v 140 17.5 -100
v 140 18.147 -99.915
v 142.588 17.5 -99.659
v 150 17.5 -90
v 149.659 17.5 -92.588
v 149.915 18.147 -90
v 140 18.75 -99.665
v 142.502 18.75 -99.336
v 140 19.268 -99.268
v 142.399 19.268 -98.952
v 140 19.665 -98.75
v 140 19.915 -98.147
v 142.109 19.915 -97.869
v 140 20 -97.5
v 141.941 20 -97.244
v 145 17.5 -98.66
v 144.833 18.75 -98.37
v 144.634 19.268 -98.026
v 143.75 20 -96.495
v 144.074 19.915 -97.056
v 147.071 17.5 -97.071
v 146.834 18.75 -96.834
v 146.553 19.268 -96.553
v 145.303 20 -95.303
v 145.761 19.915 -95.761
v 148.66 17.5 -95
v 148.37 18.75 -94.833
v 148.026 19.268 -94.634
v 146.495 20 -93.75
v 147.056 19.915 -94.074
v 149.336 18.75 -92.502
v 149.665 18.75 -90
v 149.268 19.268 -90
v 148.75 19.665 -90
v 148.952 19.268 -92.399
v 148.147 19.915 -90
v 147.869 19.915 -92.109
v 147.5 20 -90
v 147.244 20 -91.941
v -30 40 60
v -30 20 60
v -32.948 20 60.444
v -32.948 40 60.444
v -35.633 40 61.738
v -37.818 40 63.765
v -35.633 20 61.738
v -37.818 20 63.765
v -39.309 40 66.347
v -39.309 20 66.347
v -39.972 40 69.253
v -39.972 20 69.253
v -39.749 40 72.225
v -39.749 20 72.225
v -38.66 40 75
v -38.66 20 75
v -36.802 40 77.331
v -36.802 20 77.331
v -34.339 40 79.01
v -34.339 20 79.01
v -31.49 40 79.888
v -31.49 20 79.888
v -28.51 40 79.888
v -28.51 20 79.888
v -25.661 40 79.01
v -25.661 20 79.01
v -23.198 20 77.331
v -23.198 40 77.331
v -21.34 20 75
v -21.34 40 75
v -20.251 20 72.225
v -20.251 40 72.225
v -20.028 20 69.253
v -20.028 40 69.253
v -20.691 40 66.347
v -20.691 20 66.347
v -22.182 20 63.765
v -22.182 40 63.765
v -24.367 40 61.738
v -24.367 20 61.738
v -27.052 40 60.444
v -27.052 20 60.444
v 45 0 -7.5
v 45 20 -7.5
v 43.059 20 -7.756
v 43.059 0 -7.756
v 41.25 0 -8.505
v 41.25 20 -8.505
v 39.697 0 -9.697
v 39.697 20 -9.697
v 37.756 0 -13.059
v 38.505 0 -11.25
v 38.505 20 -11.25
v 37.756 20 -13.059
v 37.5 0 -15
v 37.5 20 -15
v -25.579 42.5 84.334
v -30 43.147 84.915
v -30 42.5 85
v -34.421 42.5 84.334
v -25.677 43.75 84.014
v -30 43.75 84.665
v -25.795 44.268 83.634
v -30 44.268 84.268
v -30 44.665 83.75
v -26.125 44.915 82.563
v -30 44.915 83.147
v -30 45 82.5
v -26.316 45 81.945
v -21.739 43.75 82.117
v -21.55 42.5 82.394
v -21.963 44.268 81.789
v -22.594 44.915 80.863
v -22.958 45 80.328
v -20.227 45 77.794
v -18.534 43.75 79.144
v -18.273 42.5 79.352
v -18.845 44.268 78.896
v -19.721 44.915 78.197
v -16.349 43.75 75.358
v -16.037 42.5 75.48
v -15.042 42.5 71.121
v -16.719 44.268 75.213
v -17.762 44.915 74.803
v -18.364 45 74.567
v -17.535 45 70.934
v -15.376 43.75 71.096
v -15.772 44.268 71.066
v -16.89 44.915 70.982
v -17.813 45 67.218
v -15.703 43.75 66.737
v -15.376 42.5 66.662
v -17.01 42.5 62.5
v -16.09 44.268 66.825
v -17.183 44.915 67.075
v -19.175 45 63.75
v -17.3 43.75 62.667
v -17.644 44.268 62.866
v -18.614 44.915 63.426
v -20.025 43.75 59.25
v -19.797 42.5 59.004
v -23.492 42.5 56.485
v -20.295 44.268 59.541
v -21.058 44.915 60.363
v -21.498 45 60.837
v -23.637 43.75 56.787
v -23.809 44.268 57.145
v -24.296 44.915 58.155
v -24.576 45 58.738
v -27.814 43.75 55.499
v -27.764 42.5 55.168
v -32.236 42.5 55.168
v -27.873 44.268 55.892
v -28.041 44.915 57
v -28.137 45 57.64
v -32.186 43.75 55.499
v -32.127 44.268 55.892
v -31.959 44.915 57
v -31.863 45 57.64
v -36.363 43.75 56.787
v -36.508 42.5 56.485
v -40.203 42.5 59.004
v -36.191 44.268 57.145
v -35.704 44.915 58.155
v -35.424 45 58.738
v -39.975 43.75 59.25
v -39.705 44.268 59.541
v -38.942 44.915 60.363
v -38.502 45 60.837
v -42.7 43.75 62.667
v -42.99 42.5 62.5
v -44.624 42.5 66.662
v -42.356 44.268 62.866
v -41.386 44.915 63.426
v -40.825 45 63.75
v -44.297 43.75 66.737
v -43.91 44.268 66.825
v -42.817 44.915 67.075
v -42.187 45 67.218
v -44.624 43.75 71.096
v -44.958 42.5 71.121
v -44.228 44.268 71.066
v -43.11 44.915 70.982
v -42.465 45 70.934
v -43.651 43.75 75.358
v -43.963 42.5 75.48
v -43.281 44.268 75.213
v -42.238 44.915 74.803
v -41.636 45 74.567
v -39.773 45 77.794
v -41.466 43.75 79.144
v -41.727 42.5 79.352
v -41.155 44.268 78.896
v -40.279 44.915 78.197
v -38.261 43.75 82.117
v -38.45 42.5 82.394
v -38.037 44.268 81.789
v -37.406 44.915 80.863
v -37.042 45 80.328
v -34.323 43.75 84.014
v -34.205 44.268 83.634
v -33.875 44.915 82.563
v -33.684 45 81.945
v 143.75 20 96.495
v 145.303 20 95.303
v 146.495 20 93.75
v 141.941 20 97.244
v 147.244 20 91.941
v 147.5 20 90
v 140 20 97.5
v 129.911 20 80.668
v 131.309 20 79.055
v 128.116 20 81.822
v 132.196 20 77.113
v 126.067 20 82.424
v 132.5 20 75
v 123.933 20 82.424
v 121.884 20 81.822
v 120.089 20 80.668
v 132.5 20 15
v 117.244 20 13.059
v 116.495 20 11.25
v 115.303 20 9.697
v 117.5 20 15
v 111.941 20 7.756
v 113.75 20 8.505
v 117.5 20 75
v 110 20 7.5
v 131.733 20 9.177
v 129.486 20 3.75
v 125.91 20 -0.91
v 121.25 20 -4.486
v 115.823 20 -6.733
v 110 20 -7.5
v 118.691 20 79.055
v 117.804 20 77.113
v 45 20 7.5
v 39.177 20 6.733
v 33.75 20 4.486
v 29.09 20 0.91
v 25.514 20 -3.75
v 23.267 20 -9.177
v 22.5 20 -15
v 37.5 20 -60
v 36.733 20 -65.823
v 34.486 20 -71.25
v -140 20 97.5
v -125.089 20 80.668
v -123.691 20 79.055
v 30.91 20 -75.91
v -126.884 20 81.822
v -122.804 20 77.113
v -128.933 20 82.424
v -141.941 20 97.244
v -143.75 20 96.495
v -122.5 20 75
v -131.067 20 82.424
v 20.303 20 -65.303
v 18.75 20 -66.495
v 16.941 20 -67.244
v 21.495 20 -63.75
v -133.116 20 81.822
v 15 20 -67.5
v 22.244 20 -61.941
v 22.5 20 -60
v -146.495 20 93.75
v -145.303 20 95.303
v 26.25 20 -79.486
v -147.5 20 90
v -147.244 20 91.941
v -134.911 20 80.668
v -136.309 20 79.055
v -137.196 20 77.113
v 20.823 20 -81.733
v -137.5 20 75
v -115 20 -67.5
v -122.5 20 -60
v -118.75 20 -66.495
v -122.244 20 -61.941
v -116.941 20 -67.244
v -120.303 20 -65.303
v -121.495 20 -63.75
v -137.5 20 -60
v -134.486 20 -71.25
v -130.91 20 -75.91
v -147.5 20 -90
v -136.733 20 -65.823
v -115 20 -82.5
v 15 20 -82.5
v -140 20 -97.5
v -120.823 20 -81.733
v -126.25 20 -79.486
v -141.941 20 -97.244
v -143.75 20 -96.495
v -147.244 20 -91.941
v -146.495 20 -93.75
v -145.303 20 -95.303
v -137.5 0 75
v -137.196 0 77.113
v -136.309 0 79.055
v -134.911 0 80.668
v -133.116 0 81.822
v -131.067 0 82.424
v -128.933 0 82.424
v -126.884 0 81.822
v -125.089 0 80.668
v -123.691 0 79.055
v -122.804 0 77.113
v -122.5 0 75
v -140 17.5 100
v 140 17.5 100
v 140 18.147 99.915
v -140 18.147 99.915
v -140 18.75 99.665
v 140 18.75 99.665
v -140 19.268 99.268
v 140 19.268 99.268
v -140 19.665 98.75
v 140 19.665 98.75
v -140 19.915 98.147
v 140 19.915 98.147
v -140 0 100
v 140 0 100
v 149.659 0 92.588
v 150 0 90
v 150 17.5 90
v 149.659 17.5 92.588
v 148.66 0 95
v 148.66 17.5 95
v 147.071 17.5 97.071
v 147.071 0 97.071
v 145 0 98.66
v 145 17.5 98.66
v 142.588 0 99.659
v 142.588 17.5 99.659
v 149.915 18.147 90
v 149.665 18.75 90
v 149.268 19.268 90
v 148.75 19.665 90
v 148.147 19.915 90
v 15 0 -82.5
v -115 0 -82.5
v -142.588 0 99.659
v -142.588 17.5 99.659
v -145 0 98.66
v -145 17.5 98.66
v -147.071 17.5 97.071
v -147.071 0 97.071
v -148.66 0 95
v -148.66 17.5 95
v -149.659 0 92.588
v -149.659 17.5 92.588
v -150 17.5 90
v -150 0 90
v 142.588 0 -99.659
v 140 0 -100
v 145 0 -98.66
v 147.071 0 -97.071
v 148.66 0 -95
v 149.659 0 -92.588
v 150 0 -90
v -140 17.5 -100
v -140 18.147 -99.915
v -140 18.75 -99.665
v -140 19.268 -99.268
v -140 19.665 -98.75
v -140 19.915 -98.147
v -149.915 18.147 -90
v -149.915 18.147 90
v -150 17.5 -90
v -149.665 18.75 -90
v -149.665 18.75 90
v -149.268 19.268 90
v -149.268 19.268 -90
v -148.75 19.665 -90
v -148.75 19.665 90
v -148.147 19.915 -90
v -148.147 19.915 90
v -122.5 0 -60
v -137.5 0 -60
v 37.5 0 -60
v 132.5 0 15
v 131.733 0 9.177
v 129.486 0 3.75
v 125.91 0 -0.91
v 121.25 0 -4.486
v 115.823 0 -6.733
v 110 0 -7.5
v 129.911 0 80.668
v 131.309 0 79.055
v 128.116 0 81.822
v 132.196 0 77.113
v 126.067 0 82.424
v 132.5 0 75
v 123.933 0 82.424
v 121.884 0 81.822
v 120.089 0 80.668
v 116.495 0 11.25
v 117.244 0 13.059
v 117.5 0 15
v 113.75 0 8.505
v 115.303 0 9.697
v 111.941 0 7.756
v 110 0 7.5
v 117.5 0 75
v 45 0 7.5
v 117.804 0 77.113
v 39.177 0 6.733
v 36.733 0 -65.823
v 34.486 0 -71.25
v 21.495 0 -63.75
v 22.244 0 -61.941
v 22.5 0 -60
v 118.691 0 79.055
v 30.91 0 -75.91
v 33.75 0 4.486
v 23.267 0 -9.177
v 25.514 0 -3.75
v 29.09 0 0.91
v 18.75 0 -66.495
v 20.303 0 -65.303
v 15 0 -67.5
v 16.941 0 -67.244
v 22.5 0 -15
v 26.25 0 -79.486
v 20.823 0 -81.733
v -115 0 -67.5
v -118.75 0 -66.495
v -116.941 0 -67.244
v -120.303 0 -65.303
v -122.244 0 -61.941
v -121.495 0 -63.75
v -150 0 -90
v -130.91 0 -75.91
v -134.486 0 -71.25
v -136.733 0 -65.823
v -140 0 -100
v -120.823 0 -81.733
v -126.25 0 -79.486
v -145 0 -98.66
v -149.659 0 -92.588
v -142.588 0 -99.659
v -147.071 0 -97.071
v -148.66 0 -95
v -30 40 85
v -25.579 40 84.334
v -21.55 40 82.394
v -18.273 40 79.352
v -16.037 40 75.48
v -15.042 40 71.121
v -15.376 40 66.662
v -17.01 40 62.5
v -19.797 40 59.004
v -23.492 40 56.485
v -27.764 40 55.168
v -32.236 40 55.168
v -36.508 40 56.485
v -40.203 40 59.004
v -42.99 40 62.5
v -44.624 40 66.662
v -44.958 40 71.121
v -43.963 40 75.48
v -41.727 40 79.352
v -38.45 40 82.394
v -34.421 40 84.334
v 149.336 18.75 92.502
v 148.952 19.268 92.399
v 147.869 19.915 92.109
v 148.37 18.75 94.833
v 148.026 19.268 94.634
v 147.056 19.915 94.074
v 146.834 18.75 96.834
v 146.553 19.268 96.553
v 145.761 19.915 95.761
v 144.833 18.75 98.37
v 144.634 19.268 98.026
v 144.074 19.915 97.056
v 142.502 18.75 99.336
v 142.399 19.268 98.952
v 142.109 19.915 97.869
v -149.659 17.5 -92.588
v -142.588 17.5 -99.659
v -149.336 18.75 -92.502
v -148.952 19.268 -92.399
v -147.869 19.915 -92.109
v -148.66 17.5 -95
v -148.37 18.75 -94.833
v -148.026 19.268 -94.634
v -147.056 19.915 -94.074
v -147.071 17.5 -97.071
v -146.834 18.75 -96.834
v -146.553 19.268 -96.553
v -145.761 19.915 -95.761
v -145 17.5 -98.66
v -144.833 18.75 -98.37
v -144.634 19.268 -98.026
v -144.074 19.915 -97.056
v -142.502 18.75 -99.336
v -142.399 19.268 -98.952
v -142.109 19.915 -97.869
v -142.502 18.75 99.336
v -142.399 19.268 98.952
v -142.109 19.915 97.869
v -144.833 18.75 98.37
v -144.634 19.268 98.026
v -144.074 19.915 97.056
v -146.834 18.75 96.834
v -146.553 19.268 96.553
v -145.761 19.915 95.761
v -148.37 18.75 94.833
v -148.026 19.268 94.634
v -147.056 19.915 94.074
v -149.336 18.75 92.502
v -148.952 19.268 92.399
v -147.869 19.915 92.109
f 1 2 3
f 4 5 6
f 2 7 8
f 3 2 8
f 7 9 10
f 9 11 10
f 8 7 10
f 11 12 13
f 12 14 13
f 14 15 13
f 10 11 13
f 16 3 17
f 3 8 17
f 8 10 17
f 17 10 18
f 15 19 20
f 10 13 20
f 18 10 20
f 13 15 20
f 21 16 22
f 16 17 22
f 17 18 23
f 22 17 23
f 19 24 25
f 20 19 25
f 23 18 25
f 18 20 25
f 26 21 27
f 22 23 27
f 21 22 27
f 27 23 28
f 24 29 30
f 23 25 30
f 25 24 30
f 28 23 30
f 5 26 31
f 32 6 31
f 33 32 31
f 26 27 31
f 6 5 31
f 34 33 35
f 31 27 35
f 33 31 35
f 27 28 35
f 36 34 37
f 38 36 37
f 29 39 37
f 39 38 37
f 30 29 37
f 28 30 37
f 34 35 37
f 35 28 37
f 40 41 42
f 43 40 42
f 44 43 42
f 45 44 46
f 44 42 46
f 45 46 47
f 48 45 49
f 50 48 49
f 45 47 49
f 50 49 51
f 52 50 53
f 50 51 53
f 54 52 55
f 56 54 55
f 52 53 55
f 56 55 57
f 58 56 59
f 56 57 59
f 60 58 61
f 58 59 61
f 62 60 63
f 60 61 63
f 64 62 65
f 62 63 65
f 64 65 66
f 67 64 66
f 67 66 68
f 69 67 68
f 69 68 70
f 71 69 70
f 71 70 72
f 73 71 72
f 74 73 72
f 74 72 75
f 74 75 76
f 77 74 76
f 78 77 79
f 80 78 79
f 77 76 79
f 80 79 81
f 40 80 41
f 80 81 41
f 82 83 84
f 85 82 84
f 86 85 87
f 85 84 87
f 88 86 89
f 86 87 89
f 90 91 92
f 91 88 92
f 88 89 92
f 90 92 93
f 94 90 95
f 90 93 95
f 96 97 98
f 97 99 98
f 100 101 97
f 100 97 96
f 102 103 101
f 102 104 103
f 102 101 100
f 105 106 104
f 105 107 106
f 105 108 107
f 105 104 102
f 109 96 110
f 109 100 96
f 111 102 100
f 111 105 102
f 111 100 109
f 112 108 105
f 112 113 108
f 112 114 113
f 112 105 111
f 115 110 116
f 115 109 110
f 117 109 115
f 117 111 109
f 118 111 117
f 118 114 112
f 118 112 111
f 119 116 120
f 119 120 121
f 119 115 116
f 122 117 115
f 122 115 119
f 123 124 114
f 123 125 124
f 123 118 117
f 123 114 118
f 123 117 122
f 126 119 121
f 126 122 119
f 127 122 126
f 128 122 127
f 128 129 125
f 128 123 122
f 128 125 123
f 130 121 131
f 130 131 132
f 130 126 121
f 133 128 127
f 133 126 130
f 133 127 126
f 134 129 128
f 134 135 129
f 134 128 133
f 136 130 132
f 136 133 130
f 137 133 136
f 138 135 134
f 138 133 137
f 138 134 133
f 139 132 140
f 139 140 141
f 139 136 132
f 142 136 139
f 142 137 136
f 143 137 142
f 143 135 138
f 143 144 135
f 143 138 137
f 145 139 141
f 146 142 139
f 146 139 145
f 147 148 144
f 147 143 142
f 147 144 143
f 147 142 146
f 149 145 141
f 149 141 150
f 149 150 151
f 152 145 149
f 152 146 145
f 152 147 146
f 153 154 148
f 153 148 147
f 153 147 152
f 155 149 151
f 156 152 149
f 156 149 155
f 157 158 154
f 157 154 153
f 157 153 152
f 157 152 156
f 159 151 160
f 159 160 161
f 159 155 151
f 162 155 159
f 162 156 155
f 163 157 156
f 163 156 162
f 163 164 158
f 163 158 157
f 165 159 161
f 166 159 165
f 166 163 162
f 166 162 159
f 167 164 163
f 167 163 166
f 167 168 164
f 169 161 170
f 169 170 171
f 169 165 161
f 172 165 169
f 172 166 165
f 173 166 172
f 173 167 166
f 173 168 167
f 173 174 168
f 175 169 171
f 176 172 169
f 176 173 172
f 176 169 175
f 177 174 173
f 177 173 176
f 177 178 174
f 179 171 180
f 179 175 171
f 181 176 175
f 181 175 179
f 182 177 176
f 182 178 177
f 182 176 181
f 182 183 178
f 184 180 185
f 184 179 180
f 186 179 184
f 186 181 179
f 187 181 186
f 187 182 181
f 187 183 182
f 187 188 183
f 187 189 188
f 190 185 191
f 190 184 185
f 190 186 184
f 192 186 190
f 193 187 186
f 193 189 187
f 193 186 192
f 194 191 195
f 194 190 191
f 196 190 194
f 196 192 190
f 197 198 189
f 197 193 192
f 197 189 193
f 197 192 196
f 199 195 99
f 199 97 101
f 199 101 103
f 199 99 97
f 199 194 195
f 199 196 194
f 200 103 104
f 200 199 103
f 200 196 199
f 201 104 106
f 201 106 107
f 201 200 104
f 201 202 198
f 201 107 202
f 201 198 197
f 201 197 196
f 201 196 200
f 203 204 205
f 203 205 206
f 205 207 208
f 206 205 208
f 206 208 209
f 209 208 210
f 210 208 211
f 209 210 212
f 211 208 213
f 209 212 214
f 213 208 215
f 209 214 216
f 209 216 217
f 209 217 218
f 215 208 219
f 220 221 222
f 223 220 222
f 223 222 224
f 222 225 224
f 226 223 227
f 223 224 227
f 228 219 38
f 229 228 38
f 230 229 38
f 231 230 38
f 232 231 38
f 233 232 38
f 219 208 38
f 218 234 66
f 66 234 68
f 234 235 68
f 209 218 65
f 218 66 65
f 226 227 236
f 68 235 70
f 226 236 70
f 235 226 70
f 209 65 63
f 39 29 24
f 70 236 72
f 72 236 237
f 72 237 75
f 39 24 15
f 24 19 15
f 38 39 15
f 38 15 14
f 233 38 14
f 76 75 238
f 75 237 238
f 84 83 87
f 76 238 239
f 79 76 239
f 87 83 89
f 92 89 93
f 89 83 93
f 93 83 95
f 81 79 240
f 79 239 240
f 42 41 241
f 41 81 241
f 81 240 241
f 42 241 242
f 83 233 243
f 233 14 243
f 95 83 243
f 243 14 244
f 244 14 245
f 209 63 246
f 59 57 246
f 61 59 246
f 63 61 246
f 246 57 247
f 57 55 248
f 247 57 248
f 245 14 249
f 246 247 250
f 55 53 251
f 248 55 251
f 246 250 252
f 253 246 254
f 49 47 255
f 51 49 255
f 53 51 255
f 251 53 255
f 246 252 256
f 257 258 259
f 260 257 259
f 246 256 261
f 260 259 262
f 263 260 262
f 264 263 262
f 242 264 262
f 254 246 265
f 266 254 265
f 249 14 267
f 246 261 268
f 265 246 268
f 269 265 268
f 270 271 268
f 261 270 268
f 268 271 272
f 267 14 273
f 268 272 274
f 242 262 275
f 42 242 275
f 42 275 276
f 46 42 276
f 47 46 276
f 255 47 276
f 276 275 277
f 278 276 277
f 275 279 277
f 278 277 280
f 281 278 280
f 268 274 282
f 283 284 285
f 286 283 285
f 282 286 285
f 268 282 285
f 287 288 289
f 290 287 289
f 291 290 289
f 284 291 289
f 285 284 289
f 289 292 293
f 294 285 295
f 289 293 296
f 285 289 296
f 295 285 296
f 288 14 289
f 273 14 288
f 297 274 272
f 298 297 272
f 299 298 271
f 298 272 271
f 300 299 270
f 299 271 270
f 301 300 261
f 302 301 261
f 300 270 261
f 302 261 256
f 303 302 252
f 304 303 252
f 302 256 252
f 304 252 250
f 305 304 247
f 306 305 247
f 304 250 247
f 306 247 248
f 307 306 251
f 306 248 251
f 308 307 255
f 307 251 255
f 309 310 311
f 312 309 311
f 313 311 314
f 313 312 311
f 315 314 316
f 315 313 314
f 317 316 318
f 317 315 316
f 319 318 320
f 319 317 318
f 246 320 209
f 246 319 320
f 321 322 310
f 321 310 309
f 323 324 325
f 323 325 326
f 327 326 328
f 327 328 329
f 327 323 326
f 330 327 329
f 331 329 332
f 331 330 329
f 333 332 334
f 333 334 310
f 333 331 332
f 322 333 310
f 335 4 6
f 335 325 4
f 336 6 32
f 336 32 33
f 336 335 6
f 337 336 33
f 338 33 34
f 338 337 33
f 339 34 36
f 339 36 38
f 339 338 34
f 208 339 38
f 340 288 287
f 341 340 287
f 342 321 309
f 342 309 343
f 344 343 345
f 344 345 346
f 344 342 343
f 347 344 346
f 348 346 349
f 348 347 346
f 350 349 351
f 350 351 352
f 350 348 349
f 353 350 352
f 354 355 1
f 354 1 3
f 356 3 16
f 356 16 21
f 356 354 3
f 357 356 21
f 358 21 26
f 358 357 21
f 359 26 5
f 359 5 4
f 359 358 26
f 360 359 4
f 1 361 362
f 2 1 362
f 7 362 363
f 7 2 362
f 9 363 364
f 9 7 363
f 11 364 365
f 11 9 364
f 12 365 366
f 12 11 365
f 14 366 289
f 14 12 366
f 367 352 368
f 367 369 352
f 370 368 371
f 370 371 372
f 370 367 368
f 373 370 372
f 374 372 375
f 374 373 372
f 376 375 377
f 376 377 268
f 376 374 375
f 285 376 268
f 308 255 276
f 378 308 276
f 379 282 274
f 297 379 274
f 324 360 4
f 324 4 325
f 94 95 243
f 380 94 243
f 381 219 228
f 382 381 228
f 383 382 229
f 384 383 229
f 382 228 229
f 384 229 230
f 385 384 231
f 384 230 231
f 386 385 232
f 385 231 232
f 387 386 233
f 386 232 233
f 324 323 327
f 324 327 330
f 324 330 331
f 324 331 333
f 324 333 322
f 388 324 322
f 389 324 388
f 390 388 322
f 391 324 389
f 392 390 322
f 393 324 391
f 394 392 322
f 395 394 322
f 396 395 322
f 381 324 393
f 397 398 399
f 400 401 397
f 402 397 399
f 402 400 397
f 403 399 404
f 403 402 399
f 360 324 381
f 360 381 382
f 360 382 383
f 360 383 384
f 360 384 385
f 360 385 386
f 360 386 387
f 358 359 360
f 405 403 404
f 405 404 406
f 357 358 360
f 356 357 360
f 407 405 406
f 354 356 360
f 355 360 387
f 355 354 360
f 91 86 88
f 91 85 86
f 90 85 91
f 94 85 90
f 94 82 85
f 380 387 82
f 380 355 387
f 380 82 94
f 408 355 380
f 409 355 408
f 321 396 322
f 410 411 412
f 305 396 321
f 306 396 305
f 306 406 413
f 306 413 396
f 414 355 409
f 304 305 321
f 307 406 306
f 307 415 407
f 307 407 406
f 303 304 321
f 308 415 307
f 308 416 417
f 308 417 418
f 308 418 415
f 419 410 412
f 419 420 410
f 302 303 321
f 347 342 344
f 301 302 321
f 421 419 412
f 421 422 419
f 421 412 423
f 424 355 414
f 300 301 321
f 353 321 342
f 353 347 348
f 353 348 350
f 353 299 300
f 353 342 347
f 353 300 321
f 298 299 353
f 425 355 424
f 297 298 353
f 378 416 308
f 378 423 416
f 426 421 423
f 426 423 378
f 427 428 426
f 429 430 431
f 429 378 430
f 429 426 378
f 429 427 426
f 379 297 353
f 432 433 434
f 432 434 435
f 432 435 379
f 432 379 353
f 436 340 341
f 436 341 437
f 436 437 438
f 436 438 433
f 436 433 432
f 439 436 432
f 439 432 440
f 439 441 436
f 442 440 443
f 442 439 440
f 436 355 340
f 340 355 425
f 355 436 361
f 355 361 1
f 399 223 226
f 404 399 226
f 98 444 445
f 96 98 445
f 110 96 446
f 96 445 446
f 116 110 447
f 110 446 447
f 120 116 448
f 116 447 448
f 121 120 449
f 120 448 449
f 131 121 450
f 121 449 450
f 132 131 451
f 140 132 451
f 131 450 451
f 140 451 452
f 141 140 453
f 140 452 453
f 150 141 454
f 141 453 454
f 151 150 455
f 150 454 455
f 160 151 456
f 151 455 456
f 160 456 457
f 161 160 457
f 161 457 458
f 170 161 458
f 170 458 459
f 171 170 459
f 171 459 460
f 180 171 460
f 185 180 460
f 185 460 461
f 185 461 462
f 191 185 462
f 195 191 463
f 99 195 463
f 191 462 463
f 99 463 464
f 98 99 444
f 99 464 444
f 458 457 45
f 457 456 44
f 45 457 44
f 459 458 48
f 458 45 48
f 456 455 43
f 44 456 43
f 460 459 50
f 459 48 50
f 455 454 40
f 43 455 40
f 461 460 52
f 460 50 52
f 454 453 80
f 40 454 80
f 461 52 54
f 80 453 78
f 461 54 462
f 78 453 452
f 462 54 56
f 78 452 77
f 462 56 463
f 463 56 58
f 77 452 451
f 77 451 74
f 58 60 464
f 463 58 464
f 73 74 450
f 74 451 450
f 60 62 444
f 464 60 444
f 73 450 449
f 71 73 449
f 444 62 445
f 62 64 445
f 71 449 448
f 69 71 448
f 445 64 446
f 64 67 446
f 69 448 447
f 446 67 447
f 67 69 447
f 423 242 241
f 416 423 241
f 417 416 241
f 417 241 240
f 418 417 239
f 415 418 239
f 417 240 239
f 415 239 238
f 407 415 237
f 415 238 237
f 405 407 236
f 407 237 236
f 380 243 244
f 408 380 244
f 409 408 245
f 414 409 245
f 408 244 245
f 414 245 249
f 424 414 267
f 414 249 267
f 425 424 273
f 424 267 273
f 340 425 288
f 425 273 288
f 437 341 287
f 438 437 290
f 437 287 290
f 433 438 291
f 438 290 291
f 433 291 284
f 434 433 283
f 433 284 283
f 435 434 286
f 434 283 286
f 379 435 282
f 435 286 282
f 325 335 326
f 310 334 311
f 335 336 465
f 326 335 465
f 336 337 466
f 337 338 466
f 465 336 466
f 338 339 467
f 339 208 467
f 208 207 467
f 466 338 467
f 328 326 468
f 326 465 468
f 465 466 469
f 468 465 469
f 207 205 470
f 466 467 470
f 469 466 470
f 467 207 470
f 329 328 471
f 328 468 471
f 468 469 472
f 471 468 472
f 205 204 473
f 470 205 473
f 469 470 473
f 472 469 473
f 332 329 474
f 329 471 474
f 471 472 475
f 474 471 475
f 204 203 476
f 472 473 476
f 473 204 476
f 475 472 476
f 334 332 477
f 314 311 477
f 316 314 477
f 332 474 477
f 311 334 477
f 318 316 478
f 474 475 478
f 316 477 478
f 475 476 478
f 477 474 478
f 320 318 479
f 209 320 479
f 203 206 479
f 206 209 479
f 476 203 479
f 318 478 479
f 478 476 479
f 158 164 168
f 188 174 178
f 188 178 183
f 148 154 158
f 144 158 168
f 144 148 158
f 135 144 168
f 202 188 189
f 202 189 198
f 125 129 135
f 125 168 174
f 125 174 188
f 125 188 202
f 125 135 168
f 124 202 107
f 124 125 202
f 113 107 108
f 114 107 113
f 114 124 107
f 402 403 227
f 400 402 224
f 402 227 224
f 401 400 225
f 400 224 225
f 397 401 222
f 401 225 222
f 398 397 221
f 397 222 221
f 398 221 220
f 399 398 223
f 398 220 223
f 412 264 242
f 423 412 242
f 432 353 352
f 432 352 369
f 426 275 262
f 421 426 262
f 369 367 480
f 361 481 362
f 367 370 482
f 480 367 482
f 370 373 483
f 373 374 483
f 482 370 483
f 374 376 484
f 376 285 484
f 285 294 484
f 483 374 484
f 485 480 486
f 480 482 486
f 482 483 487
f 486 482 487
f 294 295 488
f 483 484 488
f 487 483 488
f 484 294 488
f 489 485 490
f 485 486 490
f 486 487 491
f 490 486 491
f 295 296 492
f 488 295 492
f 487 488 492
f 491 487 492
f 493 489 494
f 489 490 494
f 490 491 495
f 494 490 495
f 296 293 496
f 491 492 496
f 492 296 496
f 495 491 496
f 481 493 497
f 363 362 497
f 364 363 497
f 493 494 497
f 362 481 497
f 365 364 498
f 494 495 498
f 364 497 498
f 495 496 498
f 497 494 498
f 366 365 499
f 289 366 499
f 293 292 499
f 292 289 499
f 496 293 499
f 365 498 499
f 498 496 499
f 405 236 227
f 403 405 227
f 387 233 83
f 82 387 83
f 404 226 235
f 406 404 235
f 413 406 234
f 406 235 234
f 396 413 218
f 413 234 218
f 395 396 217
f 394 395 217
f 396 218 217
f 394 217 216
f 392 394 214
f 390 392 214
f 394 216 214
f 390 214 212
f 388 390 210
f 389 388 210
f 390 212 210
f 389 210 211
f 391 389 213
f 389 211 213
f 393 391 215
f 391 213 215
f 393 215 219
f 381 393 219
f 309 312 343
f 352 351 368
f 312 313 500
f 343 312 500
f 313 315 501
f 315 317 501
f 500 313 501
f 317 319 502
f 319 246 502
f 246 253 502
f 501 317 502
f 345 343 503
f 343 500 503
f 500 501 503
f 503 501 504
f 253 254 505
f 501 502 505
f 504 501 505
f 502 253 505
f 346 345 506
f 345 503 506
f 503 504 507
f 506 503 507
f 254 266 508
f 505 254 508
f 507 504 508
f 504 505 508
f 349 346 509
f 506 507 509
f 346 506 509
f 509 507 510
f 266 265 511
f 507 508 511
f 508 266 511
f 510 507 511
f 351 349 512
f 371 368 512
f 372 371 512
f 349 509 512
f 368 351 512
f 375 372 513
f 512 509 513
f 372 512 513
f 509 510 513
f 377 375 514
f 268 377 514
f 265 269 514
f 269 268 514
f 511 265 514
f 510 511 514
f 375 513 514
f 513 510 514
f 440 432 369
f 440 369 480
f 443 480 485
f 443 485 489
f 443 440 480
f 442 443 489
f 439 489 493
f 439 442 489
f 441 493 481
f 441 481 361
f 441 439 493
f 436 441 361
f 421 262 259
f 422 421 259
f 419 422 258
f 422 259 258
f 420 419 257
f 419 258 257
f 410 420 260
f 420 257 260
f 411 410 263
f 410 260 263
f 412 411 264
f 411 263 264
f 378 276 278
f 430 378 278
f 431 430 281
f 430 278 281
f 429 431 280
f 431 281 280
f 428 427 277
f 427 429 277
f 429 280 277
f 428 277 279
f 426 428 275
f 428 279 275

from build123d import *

# Parameters (mm, degrees)
BOSS_EXTRUDE1_DEPTH = 20
FILLET1_R           = 2.5
CUT_EXTRUDE1_REACH  = 183.384
SKETCH4_R           = 10
BOSS_EXTRUDE2_DEPTH = 20
SKETCH5_R           = 15
BOSS_EXTRUDE3_DEPTH = 5
FILLET2_R           = 2.5


with BuildPart() as part:
    # Sketch1 → Boss-Extrude1 (new body)
    with BuildSketch(Plane(origin=(0, 0, 0), x_dir=(1, 0, 0), z_dir=(0, 1, 0))):
        with BuildLine():
            Line((-140, 100), (140, 100))
            ThreePointArc((140, 100), (147.071067812, 97.071067812), (150, 90))
            Line((150, 90), (150, -90))
            ThreePointArc((150, -90), (147.071067812, -97.071067812), (140, -100))
            Line((140, -100), (-140, -100))
            ThreePointArc((-140, -100), (-147.071067812, -97.071067812), (-150, -90))
            Line((-150, -90), (-150, 90))
            ThreePointArc((-150, 90), (-147.071067812, 97.071067812), (-140, 100))
        make_face()
    extrude(amount=BOSS_EXTRUDE1_DEPTH)

    # Fillet1
    fillet1_edges = [part.edges().sort_by_distance(p)[0] for p in [
        (-147.071067812, 20, -97.071067812),
        (-150, 20, 0),
        (-147.071067812, 20, 97.071067812),
        (0, 20, 100),
        (147.071067812, 20, 97.071067812),
        (150, 20, 0),
        (147.071067812, 20, -97.071067812),
        (0, 20, -100),
    ]]
    fillet(fillet1_edges, radius=FILLET1_R)

    # Sketch3 → Cut-Extrude1 (cut, up to next)
    with BuildSketch(Plane(origin=(0, 20, 0), x_dir=(1, 0, 0), z_dir=(0, 1, 0)), mode=Mode.PRIVATE) as cut_extrude1_sk1:
        with BuildLine():
            Line((-122.5, -75), (-122.5, 60))
            ThreePointArc((-122.5, 60), (-120.303300859, 65.303300859), (-115, 67.5))
            Line((-115, 67.5), (15, 67.5))
            ThreePointArc((15, 67.5), (20.303300859, 65.303300859), (22.5, 60))
            Line((22.5, 60), (22.5, 15))
            ThreePointArc((22.5, 15), (29.090097423, -0.909902577), (45, -7.5))
            Line((45, -7.5), (110, -7.5))
            ThreePointArc((110, -7.5), (115.303300859, -9.696699141), (117.5, -15))
            Line((117.5, -15), (117.5, -75))
            ThreePointArc((117.5, -75), (125, -82.5), (132.5, -75))
            Line((132.5, -75), (132.5, -15))
            ThreePointArc((132.5, -15), (125.909902577, 0.909902577), (110, 7.5))
            Line((110, 7.5), (45, 7.5))
            ThreePointArc((45, 7.5), (39.696699141, 9.696699141), (37.5, 15))
            Line((37.5, 15), (37.5, 60))
            ThreePointArc((37.5, 60), (30.909902577, 75.909902577), (15, 82.5))
            Line((15, 82.5), (-115, 82.5))
            ThreePointArc((-115, 82.5), (-130.909902577, 75.909902577), (-137.5, 60))
            Line((-137.5, 60), (-137.5, -75))
            ThreePointArc((-137.5, -75), (-130, -82.5), (-122.5, -75))
        make_face()
    cut_extrude1_tool1 = extrude(cut_extrude1_sk1.sketch, amount=-CUT_EXTRUDE1_REACH, mode=Mode.PRIVATE) & part.part
    add(cut_extrude1_tool1.solids().sort_by_distance((-125.664253, 20, 7.5))[0], mode=Mode.SUBTRACT)

    # Sketch4 → Boss-Extrude2 (add)
    with BuildSketch(Plane(origin=(0, 20, 0), x_dir=(1, 0, 0), z_dir=(0, 1, 0))):
        with Locations(Location((-30, -70, 0), (0, 0, 90))):
            Circle(SKETCH4_R)
    extrude(amount=BOSS_EXTRUDE2_DEPTH)

    # Sketch5 → Boss-Extrude3 (add)
    with BuildSketch(Plane(origin=(0, 40, 0), x_dir=(1, 0, 0), z_dir=(0, 1, 0))):
        with Locations(Location((-30, -70, 0), (0, 0, 270))):
            Circle(SKETCH5_R)
    extrude(amount=BOSS_EXTRUDE3_DEPTH)

    # Fillet2
    fillet2_edges = [part.edges().sort_by_distance(p)[0] for p in [
        (-30, 45, 55),
    ]]
    fillet(fillet2_edges, radius=FILLET2_R)


solid = part.part
